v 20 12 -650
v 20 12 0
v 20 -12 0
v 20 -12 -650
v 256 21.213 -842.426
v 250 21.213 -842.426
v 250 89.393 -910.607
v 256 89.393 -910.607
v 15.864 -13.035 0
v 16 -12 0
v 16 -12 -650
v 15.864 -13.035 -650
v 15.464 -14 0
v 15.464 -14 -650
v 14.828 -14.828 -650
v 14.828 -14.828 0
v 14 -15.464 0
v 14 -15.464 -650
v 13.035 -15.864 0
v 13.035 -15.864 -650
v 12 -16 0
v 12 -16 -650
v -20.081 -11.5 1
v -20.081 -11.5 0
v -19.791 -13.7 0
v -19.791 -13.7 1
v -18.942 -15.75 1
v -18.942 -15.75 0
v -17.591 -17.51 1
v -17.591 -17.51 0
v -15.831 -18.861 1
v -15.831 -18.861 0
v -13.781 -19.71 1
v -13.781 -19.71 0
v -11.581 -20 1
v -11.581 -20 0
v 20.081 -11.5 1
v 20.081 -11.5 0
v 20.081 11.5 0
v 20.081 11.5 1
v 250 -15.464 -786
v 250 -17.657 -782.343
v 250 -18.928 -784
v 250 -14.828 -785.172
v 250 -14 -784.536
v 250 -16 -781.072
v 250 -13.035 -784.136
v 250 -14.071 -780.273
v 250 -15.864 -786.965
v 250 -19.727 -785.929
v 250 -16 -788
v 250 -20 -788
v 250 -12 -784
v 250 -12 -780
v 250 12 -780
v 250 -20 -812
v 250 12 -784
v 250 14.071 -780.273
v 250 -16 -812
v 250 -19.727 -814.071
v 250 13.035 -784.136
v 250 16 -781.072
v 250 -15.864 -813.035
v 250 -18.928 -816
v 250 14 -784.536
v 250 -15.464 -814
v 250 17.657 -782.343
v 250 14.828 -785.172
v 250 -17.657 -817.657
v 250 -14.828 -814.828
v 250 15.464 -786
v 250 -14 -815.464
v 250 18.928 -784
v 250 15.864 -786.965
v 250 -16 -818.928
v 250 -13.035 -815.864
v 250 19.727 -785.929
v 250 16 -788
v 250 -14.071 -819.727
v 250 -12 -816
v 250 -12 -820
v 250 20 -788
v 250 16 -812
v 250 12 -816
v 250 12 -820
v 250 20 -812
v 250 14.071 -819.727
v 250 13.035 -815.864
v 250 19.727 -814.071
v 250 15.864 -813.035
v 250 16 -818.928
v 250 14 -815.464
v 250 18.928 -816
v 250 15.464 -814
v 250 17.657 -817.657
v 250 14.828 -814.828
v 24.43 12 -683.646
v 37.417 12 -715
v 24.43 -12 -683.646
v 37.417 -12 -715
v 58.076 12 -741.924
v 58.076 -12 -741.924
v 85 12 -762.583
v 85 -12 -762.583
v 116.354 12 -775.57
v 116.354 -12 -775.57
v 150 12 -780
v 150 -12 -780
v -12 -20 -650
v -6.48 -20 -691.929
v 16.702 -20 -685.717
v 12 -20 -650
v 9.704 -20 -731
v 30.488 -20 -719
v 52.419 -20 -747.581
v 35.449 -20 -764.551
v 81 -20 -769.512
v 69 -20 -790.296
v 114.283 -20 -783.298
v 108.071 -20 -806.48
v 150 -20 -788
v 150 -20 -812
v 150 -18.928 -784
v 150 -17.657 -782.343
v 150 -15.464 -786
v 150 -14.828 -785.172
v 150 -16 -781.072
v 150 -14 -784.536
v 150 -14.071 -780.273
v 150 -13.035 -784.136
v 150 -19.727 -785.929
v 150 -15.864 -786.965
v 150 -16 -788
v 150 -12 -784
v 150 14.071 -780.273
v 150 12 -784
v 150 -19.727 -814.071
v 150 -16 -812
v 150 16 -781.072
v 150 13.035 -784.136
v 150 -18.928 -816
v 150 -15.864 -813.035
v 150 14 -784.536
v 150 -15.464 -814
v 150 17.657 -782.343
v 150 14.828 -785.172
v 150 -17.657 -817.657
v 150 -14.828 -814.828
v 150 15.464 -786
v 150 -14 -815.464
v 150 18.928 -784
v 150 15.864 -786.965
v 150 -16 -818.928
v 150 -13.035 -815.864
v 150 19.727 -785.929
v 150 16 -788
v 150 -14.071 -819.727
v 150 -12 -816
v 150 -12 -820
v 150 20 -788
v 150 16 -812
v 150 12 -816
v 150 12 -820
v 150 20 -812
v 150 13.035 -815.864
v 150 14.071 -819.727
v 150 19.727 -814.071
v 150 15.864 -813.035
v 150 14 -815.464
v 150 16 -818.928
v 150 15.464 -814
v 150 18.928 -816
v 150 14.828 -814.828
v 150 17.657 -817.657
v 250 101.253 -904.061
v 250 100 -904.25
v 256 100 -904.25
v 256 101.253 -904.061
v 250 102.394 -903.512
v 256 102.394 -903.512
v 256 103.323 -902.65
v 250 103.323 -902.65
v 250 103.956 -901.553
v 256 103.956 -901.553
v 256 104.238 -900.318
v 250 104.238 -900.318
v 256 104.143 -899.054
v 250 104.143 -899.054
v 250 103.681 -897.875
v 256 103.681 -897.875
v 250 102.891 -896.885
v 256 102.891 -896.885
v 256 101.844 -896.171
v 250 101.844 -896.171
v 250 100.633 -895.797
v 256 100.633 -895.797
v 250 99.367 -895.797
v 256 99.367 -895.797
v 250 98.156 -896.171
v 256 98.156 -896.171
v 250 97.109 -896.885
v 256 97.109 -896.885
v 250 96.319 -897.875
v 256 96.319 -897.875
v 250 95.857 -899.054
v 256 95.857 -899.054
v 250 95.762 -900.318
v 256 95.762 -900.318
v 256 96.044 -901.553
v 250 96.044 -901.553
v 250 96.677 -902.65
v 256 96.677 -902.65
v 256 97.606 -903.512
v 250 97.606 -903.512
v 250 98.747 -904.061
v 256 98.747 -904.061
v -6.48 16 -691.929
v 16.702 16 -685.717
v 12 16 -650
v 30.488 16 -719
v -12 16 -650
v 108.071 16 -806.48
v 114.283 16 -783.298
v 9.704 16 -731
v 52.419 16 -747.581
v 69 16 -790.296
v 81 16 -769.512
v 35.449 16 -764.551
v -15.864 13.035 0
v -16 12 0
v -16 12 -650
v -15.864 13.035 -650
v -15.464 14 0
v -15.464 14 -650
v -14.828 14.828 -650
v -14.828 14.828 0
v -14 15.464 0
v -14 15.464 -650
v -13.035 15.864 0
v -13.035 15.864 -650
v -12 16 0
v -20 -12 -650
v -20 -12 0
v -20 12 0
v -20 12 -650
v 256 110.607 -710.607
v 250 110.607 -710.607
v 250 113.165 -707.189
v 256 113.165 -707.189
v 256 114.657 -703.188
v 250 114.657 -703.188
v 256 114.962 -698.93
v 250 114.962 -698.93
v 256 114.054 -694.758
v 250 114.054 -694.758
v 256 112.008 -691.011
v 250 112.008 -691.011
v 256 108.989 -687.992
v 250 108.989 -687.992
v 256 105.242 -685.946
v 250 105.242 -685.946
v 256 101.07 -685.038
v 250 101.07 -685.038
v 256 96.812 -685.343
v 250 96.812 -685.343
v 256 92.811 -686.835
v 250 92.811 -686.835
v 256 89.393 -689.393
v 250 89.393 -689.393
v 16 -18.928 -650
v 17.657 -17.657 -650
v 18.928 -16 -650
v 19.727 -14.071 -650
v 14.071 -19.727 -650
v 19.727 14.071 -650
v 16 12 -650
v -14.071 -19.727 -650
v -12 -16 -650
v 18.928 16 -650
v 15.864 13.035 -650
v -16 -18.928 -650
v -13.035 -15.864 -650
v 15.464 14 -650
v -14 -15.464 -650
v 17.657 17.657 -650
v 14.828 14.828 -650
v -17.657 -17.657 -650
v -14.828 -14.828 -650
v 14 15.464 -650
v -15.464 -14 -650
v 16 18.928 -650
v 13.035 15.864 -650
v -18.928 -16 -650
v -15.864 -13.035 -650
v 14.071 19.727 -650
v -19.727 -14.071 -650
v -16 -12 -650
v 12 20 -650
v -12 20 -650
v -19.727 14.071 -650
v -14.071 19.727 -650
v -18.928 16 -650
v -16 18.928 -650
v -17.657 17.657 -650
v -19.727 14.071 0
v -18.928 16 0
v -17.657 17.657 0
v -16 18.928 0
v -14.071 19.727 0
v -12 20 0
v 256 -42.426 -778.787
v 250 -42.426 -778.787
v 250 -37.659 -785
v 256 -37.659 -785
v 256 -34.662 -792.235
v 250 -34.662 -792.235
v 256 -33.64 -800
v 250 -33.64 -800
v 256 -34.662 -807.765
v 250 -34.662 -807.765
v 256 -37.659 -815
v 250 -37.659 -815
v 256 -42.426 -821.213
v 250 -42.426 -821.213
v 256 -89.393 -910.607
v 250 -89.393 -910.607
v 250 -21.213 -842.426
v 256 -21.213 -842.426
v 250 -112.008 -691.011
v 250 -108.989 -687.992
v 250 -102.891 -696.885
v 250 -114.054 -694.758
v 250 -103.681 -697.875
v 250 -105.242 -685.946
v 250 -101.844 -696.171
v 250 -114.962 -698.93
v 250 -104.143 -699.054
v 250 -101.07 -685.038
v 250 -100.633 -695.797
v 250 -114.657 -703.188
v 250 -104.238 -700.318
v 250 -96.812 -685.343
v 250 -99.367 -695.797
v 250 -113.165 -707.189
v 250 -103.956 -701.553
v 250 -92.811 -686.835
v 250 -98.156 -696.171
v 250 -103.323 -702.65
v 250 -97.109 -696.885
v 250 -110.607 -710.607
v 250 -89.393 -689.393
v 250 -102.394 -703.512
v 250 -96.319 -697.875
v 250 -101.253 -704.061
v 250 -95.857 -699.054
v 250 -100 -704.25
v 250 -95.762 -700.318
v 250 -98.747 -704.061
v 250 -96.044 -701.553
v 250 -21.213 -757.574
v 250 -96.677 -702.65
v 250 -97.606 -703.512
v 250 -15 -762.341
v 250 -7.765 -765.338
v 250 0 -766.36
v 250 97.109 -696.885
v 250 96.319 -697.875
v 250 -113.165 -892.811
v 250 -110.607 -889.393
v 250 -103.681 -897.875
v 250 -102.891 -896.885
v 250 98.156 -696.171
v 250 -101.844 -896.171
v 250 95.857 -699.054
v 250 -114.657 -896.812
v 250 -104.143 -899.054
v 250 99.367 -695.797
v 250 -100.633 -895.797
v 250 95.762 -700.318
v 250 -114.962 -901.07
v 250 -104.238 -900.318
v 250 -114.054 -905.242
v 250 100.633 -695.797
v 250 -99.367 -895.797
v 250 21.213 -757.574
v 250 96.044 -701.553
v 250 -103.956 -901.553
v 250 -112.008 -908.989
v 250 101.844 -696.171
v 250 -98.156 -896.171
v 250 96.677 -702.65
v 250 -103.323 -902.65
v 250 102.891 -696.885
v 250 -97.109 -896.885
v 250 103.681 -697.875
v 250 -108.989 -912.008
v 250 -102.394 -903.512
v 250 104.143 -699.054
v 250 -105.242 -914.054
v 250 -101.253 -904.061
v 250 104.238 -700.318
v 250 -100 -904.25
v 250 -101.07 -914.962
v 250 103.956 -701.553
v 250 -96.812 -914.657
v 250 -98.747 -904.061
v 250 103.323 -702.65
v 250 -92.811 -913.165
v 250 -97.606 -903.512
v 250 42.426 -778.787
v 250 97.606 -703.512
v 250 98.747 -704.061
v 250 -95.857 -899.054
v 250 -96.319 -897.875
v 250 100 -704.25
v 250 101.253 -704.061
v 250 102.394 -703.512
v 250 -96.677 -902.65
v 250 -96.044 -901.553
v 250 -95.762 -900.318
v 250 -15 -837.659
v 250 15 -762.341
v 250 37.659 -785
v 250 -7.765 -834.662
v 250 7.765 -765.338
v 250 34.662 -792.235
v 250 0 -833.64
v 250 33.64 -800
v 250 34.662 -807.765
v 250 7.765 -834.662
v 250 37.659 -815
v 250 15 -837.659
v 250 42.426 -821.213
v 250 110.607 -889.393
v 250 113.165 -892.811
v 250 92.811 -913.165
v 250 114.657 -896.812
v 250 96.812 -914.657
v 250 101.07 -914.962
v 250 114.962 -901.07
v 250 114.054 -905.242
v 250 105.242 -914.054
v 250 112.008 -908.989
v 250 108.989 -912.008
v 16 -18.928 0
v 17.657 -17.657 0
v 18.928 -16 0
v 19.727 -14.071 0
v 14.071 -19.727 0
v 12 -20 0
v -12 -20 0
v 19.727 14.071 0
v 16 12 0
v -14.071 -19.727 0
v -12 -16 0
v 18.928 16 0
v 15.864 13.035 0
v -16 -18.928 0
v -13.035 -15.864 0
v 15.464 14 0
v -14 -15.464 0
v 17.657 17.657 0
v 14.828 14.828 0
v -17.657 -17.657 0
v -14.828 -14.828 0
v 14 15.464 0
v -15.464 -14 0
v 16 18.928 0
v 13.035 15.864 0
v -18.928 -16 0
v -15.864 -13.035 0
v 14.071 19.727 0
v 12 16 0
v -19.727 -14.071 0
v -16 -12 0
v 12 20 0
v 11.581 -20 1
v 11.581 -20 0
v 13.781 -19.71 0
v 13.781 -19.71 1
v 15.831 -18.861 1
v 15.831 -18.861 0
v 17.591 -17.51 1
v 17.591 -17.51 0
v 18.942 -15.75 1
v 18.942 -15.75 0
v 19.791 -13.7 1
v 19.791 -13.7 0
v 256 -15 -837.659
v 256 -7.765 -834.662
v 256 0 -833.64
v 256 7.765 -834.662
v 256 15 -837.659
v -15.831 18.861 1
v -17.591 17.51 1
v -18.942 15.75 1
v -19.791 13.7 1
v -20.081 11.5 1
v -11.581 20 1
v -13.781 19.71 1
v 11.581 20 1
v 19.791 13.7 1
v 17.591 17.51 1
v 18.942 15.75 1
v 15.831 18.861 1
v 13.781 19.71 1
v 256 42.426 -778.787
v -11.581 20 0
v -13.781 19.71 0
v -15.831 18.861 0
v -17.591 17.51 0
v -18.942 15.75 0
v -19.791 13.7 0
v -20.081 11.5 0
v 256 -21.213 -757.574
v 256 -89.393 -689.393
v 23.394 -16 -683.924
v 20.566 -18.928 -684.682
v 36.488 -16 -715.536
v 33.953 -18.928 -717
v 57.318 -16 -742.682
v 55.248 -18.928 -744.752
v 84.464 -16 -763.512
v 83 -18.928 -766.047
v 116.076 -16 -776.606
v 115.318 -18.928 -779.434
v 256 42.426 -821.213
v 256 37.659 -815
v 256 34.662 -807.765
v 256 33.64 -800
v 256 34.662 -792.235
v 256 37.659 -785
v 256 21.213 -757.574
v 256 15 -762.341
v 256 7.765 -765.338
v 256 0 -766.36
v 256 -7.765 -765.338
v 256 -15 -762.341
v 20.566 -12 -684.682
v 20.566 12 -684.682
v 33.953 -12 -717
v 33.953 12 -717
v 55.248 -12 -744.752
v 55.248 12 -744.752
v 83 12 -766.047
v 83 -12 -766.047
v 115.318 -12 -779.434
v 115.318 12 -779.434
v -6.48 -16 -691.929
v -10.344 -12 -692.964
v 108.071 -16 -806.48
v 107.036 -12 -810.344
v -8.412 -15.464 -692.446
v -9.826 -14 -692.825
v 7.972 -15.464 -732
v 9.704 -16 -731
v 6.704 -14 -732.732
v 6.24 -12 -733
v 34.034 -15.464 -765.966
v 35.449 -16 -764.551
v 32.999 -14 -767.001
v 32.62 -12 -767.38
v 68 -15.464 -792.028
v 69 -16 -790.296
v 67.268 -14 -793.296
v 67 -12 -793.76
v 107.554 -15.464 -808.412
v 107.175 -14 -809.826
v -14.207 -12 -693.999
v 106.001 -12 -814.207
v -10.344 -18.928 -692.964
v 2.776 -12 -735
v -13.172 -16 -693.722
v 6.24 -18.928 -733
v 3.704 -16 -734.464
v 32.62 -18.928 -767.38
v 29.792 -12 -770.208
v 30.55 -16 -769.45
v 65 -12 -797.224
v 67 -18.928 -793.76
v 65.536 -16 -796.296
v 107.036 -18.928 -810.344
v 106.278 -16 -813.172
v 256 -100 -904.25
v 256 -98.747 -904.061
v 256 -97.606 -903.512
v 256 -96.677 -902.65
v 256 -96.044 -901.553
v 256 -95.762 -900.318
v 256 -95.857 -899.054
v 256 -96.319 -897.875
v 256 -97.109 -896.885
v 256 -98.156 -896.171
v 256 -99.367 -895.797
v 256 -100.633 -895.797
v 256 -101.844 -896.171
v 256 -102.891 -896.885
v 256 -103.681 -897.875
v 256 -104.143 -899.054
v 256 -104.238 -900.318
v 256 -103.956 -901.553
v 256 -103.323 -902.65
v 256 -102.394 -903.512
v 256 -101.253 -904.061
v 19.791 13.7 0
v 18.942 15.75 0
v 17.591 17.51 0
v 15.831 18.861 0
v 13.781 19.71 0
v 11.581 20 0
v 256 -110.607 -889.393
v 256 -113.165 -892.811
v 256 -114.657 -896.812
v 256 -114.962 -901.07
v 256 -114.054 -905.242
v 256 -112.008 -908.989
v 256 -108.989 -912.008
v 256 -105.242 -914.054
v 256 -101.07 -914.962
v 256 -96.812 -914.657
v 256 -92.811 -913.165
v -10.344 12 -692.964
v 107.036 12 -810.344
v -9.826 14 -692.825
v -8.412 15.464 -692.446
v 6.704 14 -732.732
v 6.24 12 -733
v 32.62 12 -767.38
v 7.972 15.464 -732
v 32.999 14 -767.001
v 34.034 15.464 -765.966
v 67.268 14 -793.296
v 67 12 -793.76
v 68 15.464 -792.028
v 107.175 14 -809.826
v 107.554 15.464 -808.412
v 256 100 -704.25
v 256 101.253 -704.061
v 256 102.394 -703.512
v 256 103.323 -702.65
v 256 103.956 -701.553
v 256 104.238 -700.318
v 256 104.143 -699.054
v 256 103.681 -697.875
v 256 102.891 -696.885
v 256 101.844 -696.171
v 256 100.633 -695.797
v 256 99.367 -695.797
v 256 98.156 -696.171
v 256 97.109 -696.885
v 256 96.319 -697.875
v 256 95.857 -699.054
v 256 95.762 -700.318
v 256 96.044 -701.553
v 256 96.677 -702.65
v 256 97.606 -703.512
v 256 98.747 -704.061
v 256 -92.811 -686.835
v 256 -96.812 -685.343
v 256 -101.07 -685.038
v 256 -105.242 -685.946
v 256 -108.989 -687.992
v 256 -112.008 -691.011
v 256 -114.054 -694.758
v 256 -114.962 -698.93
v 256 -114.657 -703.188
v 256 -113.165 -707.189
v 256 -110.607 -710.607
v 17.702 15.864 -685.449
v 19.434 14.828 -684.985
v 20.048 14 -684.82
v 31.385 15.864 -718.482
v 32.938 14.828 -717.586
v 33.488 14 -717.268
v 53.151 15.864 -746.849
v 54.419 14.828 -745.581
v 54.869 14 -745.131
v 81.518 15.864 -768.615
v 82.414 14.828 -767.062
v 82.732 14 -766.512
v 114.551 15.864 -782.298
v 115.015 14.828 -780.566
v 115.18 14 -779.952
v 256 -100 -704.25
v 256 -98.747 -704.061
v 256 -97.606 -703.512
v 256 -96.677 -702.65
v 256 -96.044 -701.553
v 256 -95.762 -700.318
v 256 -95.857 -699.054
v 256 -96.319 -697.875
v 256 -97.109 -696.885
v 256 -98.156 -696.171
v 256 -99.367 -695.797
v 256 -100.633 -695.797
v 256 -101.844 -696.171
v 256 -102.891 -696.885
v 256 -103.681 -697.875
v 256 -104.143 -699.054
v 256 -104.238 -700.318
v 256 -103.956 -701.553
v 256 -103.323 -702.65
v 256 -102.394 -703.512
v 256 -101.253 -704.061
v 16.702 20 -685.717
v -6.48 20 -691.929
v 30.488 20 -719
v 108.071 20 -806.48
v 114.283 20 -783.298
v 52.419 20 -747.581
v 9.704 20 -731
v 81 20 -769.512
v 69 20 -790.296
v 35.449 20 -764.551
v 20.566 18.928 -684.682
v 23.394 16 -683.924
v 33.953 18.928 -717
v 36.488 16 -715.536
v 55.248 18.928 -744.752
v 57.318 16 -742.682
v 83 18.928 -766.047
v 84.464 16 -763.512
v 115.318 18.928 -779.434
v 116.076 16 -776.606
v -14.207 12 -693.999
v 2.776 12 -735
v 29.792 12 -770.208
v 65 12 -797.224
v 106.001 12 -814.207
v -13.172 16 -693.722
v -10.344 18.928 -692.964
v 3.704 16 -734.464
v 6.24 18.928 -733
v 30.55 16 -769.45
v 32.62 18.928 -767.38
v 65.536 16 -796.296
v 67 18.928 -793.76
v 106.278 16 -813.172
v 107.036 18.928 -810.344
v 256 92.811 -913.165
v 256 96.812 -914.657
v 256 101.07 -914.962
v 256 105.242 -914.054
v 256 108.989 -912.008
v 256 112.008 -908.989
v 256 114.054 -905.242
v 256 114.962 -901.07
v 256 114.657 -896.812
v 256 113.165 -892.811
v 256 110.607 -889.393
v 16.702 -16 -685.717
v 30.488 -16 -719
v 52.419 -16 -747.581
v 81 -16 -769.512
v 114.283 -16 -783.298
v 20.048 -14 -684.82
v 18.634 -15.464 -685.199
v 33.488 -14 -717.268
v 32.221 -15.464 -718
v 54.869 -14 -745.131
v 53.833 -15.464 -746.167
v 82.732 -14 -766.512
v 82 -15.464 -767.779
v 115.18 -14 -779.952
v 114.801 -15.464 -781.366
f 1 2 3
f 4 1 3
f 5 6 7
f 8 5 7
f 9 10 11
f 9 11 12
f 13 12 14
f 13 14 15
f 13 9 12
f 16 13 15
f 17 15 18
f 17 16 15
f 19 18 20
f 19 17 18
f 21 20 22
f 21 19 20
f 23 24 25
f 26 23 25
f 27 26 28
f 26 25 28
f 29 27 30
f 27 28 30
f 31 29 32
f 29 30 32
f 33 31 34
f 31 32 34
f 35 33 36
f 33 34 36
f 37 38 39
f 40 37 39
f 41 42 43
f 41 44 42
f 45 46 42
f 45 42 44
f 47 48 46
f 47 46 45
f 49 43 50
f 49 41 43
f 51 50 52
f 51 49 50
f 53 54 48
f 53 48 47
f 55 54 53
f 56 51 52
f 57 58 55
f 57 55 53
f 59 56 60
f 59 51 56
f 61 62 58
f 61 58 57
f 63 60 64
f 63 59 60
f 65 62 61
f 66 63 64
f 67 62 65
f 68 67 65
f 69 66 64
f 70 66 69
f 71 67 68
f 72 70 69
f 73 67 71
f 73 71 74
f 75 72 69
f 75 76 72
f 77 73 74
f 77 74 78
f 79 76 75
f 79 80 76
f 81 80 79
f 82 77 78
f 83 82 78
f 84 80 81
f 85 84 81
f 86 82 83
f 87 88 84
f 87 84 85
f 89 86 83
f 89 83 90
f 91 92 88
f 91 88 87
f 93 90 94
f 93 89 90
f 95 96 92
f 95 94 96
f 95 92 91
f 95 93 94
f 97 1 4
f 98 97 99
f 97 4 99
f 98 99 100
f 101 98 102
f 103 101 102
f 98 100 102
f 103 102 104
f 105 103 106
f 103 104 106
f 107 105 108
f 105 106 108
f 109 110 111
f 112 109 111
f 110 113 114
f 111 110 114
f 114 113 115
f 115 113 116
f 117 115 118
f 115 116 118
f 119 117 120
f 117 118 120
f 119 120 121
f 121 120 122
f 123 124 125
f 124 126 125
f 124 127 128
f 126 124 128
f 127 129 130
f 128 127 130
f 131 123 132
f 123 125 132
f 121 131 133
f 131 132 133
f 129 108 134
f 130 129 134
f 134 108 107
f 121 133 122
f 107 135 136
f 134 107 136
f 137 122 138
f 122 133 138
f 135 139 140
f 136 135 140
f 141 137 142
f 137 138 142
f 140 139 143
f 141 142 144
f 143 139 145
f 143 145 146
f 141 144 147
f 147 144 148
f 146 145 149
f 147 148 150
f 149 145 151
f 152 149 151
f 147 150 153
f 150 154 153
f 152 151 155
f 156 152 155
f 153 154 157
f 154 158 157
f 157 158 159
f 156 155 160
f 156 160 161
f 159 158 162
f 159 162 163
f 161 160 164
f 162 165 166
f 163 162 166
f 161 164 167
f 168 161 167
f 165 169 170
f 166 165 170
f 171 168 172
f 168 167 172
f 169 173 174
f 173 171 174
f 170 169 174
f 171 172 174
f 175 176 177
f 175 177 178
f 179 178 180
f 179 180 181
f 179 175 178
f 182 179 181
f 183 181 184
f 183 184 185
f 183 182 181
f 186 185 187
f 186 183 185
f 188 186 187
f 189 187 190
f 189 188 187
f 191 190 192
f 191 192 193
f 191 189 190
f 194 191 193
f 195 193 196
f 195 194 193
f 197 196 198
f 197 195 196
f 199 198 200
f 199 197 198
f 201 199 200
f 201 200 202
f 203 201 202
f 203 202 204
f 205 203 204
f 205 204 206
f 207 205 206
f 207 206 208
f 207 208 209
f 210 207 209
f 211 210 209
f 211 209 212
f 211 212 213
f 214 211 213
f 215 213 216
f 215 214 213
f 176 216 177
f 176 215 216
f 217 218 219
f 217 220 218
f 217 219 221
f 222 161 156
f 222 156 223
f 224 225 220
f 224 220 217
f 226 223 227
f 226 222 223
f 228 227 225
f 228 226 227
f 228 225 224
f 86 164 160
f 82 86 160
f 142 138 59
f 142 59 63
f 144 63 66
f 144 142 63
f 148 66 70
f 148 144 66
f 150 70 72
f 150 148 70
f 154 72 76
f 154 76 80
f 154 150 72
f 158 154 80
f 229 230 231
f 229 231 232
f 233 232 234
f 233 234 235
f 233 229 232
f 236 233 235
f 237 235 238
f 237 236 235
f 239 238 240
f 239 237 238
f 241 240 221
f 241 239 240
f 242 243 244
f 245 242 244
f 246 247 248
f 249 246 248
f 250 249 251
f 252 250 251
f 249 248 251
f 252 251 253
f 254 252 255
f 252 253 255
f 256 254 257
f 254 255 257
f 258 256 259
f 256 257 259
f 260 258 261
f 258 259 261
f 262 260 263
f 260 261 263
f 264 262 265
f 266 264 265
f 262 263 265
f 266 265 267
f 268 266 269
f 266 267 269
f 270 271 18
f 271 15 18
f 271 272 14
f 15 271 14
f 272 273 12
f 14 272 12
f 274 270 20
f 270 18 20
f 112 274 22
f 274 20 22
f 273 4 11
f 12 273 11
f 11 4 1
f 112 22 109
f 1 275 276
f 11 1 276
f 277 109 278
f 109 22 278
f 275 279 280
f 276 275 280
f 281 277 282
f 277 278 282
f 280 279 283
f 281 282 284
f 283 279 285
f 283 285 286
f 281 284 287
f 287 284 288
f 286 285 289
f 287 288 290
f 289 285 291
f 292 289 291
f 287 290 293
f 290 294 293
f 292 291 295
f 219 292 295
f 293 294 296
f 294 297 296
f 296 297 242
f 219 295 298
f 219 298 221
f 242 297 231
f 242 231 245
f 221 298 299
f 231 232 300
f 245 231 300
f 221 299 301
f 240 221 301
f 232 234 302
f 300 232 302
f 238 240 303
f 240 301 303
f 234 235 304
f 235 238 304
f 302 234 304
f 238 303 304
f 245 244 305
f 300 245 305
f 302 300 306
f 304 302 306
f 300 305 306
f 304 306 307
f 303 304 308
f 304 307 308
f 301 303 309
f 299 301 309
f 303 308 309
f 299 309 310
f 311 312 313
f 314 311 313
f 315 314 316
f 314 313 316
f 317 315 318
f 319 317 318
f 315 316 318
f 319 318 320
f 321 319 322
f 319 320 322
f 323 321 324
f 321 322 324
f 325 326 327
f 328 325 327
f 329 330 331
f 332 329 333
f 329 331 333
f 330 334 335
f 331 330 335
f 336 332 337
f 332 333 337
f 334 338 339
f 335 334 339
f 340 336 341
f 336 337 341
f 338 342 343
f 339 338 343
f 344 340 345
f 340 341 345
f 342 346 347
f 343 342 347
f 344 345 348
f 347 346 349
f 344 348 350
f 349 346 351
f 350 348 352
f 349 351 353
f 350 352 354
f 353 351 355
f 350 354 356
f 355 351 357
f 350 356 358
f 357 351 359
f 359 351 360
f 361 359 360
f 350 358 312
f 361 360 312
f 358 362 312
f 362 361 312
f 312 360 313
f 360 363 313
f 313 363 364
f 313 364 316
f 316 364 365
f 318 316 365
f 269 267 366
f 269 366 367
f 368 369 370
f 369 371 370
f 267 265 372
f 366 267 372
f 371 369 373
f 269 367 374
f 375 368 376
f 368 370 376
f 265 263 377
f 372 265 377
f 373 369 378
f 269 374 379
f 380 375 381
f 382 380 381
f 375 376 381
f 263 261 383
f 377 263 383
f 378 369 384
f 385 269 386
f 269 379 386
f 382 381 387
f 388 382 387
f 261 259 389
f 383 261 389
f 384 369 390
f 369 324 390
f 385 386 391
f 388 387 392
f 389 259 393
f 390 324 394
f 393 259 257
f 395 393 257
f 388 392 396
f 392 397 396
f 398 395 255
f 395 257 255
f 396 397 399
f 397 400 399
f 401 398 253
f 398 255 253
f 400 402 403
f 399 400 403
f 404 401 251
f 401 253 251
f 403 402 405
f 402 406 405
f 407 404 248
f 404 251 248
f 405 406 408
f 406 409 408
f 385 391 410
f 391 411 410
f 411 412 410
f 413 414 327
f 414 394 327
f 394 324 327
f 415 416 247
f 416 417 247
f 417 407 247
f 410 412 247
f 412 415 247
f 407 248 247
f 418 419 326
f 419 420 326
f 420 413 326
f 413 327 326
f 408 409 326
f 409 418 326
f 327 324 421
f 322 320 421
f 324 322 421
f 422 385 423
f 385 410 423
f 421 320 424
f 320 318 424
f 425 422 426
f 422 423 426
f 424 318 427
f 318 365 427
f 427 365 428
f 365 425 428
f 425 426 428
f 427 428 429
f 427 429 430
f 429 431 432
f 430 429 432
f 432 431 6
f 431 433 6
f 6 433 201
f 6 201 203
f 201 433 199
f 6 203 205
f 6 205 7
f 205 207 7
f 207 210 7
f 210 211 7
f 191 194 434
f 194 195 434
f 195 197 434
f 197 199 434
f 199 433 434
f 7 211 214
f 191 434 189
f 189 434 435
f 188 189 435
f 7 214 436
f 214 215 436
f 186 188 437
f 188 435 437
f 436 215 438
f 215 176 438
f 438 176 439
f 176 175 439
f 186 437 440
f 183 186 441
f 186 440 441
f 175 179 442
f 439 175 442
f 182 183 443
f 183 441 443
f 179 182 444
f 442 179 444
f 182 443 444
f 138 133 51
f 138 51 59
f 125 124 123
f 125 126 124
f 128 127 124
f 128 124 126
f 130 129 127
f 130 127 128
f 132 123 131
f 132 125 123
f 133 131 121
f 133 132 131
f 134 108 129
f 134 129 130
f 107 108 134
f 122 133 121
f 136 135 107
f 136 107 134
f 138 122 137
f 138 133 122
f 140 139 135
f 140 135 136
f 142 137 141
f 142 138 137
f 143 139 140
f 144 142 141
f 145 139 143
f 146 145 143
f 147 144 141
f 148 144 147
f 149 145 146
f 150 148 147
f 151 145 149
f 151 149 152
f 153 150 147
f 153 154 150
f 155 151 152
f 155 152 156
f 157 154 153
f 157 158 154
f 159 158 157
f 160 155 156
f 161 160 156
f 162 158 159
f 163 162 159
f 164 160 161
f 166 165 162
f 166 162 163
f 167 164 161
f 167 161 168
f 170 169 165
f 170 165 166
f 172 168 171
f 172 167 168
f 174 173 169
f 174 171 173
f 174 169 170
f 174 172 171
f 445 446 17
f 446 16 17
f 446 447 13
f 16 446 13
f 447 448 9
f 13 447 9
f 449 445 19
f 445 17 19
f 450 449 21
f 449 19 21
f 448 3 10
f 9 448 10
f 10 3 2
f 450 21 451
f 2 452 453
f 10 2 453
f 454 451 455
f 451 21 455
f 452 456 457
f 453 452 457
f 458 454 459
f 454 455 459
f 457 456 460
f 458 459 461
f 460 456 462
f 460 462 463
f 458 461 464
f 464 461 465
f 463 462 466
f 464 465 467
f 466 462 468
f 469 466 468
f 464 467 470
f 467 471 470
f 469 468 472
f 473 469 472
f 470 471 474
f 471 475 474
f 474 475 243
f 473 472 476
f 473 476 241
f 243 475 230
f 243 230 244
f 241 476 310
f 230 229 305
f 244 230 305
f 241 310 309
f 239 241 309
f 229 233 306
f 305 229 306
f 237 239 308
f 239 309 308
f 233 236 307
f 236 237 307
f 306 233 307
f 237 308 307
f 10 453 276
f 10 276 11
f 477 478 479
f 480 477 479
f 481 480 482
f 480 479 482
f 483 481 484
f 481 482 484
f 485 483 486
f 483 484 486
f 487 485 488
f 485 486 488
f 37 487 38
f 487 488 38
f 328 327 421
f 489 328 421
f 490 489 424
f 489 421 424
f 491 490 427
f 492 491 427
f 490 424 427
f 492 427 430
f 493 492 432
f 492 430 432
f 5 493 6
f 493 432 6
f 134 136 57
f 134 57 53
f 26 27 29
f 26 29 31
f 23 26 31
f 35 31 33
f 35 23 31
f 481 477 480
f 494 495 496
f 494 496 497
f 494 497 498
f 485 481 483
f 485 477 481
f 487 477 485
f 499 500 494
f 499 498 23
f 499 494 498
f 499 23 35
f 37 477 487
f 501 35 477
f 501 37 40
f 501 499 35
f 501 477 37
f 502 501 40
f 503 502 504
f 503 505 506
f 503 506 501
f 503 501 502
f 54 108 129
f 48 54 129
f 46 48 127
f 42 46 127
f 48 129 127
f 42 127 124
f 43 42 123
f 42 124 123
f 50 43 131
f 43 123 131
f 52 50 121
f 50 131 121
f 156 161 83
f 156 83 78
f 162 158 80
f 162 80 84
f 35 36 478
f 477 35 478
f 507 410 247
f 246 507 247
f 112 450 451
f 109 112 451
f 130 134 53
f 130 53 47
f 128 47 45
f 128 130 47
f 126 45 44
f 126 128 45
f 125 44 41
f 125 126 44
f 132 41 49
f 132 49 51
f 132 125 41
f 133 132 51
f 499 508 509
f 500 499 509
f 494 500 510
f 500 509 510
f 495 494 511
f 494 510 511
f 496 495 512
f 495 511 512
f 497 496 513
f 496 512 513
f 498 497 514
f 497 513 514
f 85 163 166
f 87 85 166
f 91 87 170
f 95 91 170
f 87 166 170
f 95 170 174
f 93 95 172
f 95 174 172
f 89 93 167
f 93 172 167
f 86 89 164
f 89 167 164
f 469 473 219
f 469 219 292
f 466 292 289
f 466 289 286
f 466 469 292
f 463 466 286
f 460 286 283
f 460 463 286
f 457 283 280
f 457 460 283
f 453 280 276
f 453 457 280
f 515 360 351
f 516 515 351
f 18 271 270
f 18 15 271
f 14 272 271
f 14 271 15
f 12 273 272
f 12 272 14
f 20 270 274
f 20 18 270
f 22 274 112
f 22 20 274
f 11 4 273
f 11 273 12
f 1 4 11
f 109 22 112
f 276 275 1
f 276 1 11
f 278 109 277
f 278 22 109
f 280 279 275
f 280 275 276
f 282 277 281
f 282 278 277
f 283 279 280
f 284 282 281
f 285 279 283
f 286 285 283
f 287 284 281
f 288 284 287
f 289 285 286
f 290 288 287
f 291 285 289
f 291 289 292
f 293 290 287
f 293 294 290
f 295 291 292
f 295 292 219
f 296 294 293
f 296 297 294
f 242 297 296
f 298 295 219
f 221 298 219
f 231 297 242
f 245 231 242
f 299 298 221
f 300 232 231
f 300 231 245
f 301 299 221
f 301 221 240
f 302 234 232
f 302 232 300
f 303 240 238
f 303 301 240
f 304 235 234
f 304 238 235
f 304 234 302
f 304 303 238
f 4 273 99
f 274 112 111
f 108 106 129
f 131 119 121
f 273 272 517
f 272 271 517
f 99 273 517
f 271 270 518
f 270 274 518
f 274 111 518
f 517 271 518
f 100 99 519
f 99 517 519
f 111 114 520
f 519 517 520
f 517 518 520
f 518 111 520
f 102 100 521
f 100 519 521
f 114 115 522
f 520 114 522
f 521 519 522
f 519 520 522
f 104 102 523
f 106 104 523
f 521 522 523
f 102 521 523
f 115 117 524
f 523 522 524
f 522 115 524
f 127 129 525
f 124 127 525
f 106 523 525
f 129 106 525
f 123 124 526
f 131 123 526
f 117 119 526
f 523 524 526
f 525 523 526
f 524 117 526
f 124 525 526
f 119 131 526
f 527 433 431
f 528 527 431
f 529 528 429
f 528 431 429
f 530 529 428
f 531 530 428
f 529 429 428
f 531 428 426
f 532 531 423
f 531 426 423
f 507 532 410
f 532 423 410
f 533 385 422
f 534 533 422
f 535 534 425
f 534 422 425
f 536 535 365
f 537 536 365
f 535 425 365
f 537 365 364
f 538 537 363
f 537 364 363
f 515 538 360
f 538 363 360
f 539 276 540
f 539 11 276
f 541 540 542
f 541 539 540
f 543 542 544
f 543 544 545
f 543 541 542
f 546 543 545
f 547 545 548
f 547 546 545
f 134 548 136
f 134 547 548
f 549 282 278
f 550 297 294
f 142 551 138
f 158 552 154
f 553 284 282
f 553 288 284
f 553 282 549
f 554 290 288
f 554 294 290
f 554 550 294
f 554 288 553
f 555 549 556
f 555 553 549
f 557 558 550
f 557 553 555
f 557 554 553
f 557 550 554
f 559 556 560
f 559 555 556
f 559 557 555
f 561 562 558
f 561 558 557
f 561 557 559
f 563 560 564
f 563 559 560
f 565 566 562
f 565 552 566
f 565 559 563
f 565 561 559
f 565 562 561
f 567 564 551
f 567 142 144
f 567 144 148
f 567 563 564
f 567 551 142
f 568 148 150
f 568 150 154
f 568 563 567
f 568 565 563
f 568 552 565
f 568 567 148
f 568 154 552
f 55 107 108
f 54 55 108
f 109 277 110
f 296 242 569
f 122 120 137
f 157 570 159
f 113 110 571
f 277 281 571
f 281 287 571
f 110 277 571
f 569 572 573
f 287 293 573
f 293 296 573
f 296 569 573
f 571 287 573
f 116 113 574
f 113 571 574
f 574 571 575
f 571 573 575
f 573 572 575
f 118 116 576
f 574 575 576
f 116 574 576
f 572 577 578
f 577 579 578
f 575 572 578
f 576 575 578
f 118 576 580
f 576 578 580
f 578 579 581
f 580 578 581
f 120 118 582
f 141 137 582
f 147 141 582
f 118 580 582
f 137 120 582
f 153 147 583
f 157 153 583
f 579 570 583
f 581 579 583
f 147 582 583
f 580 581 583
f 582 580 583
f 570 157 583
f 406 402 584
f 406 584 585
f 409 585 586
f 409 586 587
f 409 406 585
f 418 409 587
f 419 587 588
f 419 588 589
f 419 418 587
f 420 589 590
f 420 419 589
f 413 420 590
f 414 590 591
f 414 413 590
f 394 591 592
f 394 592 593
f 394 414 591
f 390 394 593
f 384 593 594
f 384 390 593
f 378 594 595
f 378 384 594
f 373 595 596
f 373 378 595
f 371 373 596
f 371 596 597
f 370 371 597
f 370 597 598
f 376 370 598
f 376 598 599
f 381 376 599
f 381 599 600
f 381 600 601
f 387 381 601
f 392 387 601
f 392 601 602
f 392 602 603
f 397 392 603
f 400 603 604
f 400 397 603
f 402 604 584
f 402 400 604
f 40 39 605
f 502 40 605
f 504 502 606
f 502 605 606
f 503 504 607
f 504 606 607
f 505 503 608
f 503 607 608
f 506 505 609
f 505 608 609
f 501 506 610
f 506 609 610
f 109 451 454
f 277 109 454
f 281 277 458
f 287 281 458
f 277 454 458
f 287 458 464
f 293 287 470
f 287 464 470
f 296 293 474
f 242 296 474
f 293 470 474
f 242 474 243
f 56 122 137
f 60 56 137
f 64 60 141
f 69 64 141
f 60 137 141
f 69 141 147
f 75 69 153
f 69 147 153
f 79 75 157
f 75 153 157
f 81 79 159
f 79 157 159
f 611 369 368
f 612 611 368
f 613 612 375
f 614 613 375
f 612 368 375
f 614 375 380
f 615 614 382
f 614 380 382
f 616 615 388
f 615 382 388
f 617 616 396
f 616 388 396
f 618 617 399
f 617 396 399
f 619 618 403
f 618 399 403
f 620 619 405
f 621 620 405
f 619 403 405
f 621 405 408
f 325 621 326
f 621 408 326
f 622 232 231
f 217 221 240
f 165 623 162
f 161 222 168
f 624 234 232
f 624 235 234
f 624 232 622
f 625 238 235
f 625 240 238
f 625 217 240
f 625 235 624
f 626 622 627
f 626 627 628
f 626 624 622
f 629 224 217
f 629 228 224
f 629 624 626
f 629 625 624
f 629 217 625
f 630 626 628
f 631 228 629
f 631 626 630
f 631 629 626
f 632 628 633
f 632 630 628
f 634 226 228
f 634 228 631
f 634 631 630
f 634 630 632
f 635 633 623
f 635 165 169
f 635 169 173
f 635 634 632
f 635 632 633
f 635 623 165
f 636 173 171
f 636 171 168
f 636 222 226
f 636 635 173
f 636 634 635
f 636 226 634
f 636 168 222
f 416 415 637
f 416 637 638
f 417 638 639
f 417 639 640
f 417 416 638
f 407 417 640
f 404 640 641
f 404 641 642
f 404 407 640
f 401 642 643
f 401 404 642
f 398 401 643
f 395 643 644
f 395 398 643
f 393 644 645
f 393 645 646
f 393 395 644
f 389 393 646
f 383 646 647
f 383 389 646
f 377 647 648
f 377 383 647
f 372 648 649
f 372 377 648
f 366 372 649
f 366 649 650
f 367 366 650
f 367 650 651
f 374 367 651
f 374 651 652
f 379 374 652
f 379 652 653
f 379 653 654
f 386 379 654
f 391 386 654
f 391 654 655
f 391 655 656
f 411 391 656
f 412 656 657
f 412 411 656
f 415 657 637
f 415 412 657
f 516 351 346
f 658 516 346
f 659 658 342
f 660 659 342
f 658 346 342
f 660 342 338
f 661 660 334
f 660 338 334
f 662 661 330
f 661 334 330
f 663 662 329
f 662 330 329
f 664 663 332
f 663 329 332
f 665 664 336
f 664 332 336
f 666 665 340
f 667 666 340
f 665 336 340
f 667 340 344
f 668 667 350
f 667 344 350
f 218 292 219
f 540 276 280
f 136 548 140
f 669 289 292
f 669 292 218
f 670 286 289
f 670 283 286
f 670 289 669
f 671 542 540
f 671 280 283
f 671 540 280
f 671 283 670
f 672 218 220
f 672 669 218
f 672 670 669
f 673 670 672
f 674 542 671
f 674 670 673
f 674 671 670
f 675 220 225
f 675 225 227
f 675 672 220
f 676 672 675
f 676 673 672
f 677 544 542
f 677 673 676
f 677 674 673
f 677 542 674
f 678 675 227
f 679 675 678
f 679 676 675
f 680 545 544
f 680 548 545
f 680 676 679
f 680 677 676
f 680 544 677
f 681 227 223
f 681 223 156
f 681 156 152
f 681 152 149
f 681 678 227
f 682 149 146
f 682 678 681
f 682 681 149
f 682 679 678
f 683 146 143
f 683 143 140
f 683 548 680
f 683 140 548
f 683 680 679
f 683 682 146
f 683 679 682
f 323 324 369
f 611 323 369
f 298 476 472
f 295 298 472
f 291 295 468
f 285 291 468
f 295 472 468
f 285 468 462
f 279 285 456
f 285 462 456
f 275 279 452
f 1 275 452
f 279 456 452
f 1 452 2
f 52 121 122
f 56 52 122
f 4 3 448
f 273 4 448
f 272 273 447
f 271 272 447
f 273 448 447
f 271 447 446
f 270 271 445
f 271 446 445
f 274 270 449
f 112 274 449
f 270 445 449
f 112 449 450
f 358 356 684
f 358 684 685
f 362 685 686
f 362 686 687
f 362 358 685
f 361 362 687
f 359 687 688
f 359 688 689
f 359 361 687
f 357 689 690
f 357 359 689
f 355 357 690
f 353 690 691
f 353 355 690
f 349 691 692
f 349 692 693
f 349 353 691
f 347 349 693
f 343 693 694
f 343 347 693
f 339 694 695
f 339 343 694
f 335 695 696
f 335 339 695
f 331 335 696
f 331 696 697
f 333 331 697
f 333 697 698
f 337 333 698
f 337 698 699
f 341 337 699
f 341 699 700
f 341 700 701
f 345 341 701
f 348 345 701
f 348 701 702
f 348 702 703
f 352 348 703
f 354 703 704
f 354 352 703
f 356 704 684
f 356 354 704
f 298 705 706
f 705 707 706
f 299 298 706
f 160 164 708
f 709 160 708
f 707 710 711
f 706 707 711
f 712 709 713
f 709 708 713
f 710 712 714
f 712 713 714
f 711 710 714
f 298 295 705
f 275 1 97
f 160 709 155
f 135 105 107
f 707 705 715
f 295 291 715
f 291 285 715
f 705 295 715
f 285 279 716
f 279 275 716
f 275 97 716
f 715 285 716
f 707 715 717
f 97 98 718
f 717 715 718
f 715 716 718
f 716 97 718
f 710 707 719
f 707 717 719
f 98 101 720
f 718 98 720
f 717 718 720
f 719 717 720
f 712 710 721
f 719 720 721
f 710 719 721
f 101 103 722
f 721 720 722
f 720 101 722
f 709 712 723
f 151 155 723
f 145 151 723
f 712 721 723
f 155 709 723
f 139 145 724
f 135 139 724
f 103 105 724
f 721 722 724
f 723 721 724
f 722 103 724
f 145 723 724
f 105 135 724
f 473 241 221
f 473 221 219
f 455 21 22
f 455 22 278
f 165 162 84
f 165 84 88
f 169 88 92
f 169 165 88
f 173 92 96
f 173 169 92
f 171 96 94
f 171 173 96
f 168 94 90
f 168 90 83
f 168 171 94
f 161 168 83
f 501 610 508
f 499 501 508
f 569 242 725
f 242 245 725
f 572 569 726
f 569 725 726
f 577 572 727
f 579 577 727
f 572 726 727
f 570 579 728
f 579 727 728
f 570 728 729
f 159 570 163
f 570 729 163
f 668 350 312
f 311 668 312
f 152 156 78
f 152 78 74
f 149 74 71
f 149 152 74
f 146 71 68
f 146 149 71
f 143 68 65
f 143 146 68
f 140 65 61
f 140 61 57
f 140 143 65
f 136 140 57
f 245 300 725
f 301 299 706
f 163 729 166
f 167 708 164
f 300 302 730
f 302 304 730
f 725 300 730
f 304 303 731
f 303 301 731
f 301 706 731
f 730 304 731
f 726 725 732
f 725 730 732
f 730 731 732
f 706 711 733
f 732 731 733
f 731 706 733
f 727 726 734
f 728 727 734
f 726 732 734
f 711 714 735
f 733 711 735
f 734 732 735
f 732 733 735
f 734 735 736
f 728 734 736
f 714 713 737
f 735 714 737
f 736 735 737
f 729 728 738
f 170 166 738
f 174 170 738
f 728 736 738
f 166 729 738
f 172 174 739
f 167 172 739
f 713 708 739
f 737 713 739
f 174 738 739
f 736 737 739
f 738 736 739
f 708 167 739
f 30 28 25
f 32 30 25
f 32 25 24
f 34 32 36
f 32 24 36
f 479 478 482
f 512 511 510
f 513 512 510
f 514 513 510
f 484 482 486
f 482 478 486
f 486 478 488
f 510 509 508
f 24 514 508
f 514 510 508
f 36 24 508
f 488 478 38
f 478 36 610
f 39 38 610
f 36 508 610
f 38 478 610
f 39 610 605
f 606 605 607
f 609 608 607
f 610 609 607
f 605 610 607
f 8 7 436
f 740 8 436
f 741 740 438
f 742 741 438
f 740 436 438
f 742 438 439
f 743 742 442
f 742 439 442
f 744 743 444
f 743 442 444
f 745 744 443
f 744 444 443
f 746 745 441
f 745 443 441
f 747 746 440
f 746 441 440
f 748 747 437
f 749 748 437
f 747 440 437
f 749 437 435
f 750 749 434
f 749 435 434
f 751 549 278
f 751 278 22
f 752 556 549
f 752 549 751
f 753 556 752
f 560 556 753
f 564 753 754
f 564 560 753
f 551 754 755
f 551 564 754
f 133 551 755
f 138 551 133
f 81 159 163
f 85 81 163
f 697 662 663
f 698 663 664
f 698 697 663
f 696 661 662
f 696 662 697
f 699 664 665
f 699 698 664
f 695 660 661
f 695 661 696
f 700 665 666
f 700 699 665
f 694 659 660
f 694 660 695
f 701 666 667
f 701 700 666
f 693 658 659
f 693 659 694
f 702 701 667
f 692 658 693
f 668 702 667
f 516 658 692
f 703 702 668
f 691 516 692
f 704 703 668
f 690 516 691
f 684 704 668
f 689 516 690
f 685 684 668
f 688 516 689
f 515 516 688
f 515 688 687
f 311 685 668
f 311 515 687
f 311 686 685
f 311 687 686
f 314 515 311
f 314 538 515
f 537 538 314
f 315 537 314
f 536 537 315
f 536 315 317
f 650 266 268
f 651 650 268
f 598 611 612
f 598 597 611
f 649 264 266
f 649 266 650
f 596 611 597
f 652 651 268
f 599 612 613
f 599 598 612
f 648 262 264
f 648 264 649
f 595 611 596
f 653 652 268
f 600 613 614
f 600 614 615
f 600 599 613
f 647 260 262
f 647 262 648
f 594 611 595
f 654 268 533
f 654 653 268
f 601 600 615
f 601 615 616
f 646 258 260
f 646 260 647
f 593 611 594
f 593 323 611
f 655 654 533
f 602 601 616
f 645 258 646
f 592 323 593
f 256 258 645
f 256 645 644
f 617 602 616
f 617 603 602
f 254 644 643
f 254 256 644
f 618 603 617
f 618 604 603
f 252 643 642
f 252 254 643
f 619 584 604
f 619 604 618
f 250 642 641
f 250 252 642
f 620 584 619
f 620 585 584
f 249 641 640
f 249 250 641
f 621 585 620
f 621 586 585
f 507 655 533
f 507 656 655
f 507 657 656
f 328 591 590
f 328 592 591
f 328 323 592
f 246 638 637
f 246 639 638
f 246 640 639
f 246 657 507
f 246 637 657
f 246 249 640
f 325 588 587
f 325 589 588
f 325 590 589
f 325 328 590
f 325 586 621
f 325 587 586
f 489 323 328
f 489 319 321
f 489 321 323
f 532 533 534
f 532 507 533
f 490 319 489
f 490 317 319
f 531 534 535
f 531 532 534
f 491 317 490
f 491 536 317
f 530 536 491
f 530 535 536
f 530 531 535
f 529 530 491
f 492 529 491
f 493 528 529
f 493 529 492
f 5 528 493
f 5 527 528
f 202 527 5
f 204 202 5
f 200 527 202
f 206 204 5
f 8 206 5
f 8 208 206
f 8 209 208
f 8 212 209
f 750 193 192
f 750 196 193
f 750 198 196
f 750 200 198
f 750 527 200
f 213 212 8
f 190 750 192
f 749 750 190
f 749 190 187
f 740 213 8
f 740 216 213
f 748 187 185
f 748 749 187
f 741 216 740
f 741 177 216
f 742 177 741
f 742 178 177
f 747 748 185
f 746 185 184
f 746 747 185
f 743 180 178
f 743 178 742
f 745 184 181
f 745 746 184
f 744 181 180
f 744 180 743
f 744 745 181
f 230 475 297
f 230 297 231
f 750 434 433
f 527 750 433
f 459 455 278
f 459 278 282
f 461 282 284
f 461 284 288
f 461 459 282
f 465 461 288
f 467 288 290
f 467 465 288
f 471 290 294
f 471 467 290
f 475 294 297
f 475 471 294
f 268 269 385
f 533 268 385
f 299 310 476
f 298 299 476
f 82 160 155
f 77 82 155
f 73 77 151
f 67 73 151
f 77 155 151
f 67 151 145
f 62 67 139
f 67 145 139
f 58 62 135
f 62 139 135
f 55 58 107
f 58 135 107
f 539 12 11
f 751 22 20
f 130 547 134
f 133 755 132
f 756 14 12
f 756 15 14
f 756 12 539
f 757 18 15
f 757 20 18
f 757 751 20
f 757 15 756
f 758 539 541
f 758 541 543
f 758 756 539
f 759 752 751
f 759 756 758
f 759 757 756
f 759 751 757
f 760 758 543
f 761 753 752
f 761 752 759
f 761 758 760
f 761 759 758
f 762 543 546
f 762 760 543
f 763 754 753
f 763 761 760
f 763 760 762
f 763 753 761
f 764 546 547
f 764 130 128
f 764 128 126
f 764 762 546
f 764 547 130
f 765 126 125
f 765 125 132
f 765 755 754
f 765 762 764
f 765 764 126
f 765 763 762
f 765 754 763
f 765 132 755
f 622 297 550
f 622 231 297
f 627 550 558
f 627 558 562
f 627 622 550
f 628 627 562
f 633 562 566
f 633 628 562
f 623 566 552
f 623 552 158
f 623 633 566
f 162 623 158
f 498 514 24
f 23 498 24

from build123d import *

# Parameters (mm, degrees)
SQUARE_TUBE_40_X_40_X_4_1_DEPTH   = 650
SQUARE_TUBE_40_X_40_X_4_1_2_ANGLE = 90
SQUARE_TUBE_40_X_40_X_4_1_3_DEPTH = 100
BOSS_EXTRUDE1_DEPTH               = 1
SKETCH13_R                        = 4.25
BOSS_EXTRUDE2_DEPTH               = 6


with BuildPart() as part:
    # Sketch11 → Square tube 40 X 40 X 4(1) (new body)
    with BuildSketch(Plane(origin=(0, 0, 0), x_dir=(-1, 0, 0), z_dir=(0, 0, -1))):
        with BuildLine():
            Line((-12, -20), (12, -20))
            ThreePointArc((12, -20), (17.656854249, -17.656854249), (20, -12))
            Line((20, -12), (20, 12))
            ThreePointArc((20, 12), (17.656854249, 17.656854249), (12, 20))
            Line((12, 20), (-12, 20))
            ThreePointArc((-12, 20), (-17.656854249, 17.656854249), (-20, 12))
            Line((-20, 12), (-20, -12))
            ThreePointArc((-20, -12), (-17.656854249, -17.656854249), (-12, -20))
        make_face()
        with BuildLine():
            Line((-12, -16), (12, -16))
            ThreePointArc((12, -16), (14.828427125, -14.828427125), (16, -12))
            Line((16, -12), (16, 12))
            ThreePointArc((16, 12), (14.828427125, 14.828427125), (12, 16))
            Line((12, 16), (-12, 16))
            ThreePointArc((-12, 16), (-14.828427125, 14.828427125), (-16, 12))
            Line((-16, 12), (-16, -12))
            ThreePointArc((-16, -12), (-14.828427125, -14.828427125), (-12, -16))
        make_face(mode=Mode.SUBTRACT)
    extrude(amount=SQUARE_TUBE_40_X_40_X_4_1_DEPTH)


with BuildPart() as body_2:
    # Sketch11 on segment 2 (carried to the start of arc 2) → Square tube 40 X 40 X 4_1 2 (revolve)
    with BuildSketch(Plane(origin=(0, 0, -650), x_dir=(-1, 0, 0), z_dir=(0, 0, -1))):
        with BuildLine():
            Line((-12, -20), (12, -20))
            ThreePointArc((12, -20), (17.656854249, -17.656854249), (20, -12))
            Line((20, -12), (20, 12))
            ThreePointArc((20, 12), (17.656854249, 17.656854249), (12, 20))
            Line((12, 20), (-12, 20))
            ThreePointArc((-12, 20), (-17.656854249, 17.656854249), (-20, 12))
            Line((-20, 12), (-20, -12))
            ThreePointArc((-20, -12), (-17.656854249, -17.656854249), (-12, -20))
        make_face()
        with BuildLine():
            Line((-12, -16), (12, -16))
            ThreePointArc((12, -16), (14.828427125, -14.828427125), (16, -12))
            Line((16, -12), (16, 12))
            ThreePointArc((16, 12), (14.828427125, 14.828427125), (12, 16))
            Line((12, 16), (-12, 16))
            ThreePointArc((-12, 16), (-14.828427125, 14.828427125), (-16, 12))
            Line((-16, 12), (-16, -12))
            ThreePointArc((-16, -12), (-14.828427125, -14.828427125), (-12, -16))
        make_face(mode=Mode.SUBTRACT)
    revolve(axis=Axis((150, 0, -650), (0, -1, 0)), revolution_arc=SQUARE_TUBE_40_X_40_X_4_1_2_ANGLE)


with BuildPart() as body_3:
    # Sketch11 on segment 3 (carried to segment 3) → Square tube 40 X 40 X 4_1 3 (new body)
    with BuildSketch(Plane(origin=(150, 0, -800), x_dir=(0, 0, -1), z_dir=(1, 0, 0))):
        with BuildLine():
            Line((-12, -20), (12, -20))
            ThreePointArc((12, -20), (17.656854249, -17.656854249), (20, -12))
            Line((20, -12), (20, 12))
            ThreePointArc((20, 12), (17.656854249, 17.656854249), (12, 20))
            Line((12, 20), (-12, 20))
            ThreePointArc((-12, 20), (-17.656854249, 17.656854249), (-20, 12))
            Line((-20, 12), (-20, -12))
            ThreePointArc((-20, -12), (-17.656854249, -17.656854249), (-12, -20))
        make_face()
        with BuildLine():
            Line((-12, -16), (12, -16))
            ThreePointArc((12, -16), (14.828427125, -14.828427125), (16, -12))
            Line((16, -12), (16, 12))
            ThreePointArc((16, 12), (14.828427125, 14.828427125), (12, 16))
            Line((12, 16), (-12, 16))
            ThreePointArc((-12, 16), (-14.828427125, 14.828427125), (-16, 12))
            Line((-16, 12), (-16, -12))
            ThreePointArc((-16, -12), (-14.828427125, -14.828427125), (-12, -16))
        make_face(mode=Mode.SUBTRACT)
    extrude(amount=SQUARE_TUBE_40_X_40_X_4_1_3_DEPTH)


with BuildPart() as body_4:
    # Sketch12 → Boss-Extrude1 (new body)
    with BuildSketch(Plane.XY):
        with BuildLine():
            Line((-11.580971912, -20), (11.580971912, -20))
            ThreePointArc((11.580971912, -20), (17.591379552, -17.51040764), (20.080971912, -11.5))
            Line((20.080971912, -11.5), (20.080971912, 11.5))
            ThreePointArc((20.080971912, 11.5), (17.591379552, 17.51040764), (11.580971912, 20))
            Line((11.580971912, 20), (-11.580971912, 20))
            ThreePointArc((-11.580971912, 20), (-17.591379552, 17.51040764), (-20.080971912, 11.5))
            Line((-20.080971912, 11.5), (-20.080971912, -11.5))
            ThreePointArc((-20.080971912, -11.5), (-17.591379552, -17.51040764), (-11.580971912, -20))
        make_face()
    extrude(amount=BOSS_EXTRUDE1_DEPTH)


with BuildPart() as body_5:
    # Sketch13 → Boss-Extrude2 (new body)
    with BuildSketch(Plane(origin=(250, 0, 0), x_dir=(0, 0, -1), z_dir=(1, 0, 0))):
        with BuildLine():
            Line((842.426406871, 21.213203436), (910.606601718, 89.393398282))
            ThreePointArc((910.606601718, 89.393398282), (910.606601718, 110.606601718), (889.393398282, 110.606601718))
            Line((889.393398282, 110.606601718), (821.213203436, 42.426406871))
            ThreePointArc((821.213203436, 42.426406871), (800, 33.639610307), (778.786796564, 42.426406871))
            Line((778.786796564, 42.426406871), (710.606601718, 110.606601718))
            ThreePointArc((710.606601718, 110.606601718), (689.393398282, 110.606601718), (689.393398282, 89.393398282))
            Line((689.393398282, 89.393398282), (757.573593129, 21.213203436))
            ThreePointArc((757.573593129, 21.213203436), (766.360389693, 0), (757.573593129, -21.213203436))
            Line((757.573593129, -21.213203436), (689.393398282, -89.393398282))
            ThreePointArc((689.393398282, -89.393398282), (689.393398282, -110.606601718), (710.606601718, -110.606601718))
            Line((710.606601718, -110.606601718), (778.786796564, -42.426406871))
            ThreePointArc((778.786796564, -42.426406871), (800, -33.639610307), (821.213203436, -42.426406871))
            Line((821.213203436, -42.426406871), (889.393398282, -110.606601718))
            ThreePointArc((889.393398282, -110.606601718), (910.606601718, -110.606601718), (910.606601718, -89.393398282))
            Line((910.606601718, -89.393398282), (842.426406871, -21.213203436))
            ThreePointArc((842.426406871, -21.213203436), (833.639610307, 0), (842.426406871, 21.213203436))
        make_face()
        with Locations((900, 100)):
            Circle(SKETCH13_R, mode=Mode.SUBTRACT)
        with Locations((900, -100)):
            Circle(SKETCH13_R, mode=Mode.SUBTRACT)
        with Locations((700, -100)):
            Circle(SKETCH13_R, mode=Mode.SUBTRACT)
        with Locations((700, 100)):
            Circle(SKETCH13_R, mode=Mode.SUBTRACT)
    extrude(amount=BOSS_EXTRUDE2_DEPTH)


solid = Compound([part.part, body_2.part, body_3.part, body_4.part, body_5.part])
